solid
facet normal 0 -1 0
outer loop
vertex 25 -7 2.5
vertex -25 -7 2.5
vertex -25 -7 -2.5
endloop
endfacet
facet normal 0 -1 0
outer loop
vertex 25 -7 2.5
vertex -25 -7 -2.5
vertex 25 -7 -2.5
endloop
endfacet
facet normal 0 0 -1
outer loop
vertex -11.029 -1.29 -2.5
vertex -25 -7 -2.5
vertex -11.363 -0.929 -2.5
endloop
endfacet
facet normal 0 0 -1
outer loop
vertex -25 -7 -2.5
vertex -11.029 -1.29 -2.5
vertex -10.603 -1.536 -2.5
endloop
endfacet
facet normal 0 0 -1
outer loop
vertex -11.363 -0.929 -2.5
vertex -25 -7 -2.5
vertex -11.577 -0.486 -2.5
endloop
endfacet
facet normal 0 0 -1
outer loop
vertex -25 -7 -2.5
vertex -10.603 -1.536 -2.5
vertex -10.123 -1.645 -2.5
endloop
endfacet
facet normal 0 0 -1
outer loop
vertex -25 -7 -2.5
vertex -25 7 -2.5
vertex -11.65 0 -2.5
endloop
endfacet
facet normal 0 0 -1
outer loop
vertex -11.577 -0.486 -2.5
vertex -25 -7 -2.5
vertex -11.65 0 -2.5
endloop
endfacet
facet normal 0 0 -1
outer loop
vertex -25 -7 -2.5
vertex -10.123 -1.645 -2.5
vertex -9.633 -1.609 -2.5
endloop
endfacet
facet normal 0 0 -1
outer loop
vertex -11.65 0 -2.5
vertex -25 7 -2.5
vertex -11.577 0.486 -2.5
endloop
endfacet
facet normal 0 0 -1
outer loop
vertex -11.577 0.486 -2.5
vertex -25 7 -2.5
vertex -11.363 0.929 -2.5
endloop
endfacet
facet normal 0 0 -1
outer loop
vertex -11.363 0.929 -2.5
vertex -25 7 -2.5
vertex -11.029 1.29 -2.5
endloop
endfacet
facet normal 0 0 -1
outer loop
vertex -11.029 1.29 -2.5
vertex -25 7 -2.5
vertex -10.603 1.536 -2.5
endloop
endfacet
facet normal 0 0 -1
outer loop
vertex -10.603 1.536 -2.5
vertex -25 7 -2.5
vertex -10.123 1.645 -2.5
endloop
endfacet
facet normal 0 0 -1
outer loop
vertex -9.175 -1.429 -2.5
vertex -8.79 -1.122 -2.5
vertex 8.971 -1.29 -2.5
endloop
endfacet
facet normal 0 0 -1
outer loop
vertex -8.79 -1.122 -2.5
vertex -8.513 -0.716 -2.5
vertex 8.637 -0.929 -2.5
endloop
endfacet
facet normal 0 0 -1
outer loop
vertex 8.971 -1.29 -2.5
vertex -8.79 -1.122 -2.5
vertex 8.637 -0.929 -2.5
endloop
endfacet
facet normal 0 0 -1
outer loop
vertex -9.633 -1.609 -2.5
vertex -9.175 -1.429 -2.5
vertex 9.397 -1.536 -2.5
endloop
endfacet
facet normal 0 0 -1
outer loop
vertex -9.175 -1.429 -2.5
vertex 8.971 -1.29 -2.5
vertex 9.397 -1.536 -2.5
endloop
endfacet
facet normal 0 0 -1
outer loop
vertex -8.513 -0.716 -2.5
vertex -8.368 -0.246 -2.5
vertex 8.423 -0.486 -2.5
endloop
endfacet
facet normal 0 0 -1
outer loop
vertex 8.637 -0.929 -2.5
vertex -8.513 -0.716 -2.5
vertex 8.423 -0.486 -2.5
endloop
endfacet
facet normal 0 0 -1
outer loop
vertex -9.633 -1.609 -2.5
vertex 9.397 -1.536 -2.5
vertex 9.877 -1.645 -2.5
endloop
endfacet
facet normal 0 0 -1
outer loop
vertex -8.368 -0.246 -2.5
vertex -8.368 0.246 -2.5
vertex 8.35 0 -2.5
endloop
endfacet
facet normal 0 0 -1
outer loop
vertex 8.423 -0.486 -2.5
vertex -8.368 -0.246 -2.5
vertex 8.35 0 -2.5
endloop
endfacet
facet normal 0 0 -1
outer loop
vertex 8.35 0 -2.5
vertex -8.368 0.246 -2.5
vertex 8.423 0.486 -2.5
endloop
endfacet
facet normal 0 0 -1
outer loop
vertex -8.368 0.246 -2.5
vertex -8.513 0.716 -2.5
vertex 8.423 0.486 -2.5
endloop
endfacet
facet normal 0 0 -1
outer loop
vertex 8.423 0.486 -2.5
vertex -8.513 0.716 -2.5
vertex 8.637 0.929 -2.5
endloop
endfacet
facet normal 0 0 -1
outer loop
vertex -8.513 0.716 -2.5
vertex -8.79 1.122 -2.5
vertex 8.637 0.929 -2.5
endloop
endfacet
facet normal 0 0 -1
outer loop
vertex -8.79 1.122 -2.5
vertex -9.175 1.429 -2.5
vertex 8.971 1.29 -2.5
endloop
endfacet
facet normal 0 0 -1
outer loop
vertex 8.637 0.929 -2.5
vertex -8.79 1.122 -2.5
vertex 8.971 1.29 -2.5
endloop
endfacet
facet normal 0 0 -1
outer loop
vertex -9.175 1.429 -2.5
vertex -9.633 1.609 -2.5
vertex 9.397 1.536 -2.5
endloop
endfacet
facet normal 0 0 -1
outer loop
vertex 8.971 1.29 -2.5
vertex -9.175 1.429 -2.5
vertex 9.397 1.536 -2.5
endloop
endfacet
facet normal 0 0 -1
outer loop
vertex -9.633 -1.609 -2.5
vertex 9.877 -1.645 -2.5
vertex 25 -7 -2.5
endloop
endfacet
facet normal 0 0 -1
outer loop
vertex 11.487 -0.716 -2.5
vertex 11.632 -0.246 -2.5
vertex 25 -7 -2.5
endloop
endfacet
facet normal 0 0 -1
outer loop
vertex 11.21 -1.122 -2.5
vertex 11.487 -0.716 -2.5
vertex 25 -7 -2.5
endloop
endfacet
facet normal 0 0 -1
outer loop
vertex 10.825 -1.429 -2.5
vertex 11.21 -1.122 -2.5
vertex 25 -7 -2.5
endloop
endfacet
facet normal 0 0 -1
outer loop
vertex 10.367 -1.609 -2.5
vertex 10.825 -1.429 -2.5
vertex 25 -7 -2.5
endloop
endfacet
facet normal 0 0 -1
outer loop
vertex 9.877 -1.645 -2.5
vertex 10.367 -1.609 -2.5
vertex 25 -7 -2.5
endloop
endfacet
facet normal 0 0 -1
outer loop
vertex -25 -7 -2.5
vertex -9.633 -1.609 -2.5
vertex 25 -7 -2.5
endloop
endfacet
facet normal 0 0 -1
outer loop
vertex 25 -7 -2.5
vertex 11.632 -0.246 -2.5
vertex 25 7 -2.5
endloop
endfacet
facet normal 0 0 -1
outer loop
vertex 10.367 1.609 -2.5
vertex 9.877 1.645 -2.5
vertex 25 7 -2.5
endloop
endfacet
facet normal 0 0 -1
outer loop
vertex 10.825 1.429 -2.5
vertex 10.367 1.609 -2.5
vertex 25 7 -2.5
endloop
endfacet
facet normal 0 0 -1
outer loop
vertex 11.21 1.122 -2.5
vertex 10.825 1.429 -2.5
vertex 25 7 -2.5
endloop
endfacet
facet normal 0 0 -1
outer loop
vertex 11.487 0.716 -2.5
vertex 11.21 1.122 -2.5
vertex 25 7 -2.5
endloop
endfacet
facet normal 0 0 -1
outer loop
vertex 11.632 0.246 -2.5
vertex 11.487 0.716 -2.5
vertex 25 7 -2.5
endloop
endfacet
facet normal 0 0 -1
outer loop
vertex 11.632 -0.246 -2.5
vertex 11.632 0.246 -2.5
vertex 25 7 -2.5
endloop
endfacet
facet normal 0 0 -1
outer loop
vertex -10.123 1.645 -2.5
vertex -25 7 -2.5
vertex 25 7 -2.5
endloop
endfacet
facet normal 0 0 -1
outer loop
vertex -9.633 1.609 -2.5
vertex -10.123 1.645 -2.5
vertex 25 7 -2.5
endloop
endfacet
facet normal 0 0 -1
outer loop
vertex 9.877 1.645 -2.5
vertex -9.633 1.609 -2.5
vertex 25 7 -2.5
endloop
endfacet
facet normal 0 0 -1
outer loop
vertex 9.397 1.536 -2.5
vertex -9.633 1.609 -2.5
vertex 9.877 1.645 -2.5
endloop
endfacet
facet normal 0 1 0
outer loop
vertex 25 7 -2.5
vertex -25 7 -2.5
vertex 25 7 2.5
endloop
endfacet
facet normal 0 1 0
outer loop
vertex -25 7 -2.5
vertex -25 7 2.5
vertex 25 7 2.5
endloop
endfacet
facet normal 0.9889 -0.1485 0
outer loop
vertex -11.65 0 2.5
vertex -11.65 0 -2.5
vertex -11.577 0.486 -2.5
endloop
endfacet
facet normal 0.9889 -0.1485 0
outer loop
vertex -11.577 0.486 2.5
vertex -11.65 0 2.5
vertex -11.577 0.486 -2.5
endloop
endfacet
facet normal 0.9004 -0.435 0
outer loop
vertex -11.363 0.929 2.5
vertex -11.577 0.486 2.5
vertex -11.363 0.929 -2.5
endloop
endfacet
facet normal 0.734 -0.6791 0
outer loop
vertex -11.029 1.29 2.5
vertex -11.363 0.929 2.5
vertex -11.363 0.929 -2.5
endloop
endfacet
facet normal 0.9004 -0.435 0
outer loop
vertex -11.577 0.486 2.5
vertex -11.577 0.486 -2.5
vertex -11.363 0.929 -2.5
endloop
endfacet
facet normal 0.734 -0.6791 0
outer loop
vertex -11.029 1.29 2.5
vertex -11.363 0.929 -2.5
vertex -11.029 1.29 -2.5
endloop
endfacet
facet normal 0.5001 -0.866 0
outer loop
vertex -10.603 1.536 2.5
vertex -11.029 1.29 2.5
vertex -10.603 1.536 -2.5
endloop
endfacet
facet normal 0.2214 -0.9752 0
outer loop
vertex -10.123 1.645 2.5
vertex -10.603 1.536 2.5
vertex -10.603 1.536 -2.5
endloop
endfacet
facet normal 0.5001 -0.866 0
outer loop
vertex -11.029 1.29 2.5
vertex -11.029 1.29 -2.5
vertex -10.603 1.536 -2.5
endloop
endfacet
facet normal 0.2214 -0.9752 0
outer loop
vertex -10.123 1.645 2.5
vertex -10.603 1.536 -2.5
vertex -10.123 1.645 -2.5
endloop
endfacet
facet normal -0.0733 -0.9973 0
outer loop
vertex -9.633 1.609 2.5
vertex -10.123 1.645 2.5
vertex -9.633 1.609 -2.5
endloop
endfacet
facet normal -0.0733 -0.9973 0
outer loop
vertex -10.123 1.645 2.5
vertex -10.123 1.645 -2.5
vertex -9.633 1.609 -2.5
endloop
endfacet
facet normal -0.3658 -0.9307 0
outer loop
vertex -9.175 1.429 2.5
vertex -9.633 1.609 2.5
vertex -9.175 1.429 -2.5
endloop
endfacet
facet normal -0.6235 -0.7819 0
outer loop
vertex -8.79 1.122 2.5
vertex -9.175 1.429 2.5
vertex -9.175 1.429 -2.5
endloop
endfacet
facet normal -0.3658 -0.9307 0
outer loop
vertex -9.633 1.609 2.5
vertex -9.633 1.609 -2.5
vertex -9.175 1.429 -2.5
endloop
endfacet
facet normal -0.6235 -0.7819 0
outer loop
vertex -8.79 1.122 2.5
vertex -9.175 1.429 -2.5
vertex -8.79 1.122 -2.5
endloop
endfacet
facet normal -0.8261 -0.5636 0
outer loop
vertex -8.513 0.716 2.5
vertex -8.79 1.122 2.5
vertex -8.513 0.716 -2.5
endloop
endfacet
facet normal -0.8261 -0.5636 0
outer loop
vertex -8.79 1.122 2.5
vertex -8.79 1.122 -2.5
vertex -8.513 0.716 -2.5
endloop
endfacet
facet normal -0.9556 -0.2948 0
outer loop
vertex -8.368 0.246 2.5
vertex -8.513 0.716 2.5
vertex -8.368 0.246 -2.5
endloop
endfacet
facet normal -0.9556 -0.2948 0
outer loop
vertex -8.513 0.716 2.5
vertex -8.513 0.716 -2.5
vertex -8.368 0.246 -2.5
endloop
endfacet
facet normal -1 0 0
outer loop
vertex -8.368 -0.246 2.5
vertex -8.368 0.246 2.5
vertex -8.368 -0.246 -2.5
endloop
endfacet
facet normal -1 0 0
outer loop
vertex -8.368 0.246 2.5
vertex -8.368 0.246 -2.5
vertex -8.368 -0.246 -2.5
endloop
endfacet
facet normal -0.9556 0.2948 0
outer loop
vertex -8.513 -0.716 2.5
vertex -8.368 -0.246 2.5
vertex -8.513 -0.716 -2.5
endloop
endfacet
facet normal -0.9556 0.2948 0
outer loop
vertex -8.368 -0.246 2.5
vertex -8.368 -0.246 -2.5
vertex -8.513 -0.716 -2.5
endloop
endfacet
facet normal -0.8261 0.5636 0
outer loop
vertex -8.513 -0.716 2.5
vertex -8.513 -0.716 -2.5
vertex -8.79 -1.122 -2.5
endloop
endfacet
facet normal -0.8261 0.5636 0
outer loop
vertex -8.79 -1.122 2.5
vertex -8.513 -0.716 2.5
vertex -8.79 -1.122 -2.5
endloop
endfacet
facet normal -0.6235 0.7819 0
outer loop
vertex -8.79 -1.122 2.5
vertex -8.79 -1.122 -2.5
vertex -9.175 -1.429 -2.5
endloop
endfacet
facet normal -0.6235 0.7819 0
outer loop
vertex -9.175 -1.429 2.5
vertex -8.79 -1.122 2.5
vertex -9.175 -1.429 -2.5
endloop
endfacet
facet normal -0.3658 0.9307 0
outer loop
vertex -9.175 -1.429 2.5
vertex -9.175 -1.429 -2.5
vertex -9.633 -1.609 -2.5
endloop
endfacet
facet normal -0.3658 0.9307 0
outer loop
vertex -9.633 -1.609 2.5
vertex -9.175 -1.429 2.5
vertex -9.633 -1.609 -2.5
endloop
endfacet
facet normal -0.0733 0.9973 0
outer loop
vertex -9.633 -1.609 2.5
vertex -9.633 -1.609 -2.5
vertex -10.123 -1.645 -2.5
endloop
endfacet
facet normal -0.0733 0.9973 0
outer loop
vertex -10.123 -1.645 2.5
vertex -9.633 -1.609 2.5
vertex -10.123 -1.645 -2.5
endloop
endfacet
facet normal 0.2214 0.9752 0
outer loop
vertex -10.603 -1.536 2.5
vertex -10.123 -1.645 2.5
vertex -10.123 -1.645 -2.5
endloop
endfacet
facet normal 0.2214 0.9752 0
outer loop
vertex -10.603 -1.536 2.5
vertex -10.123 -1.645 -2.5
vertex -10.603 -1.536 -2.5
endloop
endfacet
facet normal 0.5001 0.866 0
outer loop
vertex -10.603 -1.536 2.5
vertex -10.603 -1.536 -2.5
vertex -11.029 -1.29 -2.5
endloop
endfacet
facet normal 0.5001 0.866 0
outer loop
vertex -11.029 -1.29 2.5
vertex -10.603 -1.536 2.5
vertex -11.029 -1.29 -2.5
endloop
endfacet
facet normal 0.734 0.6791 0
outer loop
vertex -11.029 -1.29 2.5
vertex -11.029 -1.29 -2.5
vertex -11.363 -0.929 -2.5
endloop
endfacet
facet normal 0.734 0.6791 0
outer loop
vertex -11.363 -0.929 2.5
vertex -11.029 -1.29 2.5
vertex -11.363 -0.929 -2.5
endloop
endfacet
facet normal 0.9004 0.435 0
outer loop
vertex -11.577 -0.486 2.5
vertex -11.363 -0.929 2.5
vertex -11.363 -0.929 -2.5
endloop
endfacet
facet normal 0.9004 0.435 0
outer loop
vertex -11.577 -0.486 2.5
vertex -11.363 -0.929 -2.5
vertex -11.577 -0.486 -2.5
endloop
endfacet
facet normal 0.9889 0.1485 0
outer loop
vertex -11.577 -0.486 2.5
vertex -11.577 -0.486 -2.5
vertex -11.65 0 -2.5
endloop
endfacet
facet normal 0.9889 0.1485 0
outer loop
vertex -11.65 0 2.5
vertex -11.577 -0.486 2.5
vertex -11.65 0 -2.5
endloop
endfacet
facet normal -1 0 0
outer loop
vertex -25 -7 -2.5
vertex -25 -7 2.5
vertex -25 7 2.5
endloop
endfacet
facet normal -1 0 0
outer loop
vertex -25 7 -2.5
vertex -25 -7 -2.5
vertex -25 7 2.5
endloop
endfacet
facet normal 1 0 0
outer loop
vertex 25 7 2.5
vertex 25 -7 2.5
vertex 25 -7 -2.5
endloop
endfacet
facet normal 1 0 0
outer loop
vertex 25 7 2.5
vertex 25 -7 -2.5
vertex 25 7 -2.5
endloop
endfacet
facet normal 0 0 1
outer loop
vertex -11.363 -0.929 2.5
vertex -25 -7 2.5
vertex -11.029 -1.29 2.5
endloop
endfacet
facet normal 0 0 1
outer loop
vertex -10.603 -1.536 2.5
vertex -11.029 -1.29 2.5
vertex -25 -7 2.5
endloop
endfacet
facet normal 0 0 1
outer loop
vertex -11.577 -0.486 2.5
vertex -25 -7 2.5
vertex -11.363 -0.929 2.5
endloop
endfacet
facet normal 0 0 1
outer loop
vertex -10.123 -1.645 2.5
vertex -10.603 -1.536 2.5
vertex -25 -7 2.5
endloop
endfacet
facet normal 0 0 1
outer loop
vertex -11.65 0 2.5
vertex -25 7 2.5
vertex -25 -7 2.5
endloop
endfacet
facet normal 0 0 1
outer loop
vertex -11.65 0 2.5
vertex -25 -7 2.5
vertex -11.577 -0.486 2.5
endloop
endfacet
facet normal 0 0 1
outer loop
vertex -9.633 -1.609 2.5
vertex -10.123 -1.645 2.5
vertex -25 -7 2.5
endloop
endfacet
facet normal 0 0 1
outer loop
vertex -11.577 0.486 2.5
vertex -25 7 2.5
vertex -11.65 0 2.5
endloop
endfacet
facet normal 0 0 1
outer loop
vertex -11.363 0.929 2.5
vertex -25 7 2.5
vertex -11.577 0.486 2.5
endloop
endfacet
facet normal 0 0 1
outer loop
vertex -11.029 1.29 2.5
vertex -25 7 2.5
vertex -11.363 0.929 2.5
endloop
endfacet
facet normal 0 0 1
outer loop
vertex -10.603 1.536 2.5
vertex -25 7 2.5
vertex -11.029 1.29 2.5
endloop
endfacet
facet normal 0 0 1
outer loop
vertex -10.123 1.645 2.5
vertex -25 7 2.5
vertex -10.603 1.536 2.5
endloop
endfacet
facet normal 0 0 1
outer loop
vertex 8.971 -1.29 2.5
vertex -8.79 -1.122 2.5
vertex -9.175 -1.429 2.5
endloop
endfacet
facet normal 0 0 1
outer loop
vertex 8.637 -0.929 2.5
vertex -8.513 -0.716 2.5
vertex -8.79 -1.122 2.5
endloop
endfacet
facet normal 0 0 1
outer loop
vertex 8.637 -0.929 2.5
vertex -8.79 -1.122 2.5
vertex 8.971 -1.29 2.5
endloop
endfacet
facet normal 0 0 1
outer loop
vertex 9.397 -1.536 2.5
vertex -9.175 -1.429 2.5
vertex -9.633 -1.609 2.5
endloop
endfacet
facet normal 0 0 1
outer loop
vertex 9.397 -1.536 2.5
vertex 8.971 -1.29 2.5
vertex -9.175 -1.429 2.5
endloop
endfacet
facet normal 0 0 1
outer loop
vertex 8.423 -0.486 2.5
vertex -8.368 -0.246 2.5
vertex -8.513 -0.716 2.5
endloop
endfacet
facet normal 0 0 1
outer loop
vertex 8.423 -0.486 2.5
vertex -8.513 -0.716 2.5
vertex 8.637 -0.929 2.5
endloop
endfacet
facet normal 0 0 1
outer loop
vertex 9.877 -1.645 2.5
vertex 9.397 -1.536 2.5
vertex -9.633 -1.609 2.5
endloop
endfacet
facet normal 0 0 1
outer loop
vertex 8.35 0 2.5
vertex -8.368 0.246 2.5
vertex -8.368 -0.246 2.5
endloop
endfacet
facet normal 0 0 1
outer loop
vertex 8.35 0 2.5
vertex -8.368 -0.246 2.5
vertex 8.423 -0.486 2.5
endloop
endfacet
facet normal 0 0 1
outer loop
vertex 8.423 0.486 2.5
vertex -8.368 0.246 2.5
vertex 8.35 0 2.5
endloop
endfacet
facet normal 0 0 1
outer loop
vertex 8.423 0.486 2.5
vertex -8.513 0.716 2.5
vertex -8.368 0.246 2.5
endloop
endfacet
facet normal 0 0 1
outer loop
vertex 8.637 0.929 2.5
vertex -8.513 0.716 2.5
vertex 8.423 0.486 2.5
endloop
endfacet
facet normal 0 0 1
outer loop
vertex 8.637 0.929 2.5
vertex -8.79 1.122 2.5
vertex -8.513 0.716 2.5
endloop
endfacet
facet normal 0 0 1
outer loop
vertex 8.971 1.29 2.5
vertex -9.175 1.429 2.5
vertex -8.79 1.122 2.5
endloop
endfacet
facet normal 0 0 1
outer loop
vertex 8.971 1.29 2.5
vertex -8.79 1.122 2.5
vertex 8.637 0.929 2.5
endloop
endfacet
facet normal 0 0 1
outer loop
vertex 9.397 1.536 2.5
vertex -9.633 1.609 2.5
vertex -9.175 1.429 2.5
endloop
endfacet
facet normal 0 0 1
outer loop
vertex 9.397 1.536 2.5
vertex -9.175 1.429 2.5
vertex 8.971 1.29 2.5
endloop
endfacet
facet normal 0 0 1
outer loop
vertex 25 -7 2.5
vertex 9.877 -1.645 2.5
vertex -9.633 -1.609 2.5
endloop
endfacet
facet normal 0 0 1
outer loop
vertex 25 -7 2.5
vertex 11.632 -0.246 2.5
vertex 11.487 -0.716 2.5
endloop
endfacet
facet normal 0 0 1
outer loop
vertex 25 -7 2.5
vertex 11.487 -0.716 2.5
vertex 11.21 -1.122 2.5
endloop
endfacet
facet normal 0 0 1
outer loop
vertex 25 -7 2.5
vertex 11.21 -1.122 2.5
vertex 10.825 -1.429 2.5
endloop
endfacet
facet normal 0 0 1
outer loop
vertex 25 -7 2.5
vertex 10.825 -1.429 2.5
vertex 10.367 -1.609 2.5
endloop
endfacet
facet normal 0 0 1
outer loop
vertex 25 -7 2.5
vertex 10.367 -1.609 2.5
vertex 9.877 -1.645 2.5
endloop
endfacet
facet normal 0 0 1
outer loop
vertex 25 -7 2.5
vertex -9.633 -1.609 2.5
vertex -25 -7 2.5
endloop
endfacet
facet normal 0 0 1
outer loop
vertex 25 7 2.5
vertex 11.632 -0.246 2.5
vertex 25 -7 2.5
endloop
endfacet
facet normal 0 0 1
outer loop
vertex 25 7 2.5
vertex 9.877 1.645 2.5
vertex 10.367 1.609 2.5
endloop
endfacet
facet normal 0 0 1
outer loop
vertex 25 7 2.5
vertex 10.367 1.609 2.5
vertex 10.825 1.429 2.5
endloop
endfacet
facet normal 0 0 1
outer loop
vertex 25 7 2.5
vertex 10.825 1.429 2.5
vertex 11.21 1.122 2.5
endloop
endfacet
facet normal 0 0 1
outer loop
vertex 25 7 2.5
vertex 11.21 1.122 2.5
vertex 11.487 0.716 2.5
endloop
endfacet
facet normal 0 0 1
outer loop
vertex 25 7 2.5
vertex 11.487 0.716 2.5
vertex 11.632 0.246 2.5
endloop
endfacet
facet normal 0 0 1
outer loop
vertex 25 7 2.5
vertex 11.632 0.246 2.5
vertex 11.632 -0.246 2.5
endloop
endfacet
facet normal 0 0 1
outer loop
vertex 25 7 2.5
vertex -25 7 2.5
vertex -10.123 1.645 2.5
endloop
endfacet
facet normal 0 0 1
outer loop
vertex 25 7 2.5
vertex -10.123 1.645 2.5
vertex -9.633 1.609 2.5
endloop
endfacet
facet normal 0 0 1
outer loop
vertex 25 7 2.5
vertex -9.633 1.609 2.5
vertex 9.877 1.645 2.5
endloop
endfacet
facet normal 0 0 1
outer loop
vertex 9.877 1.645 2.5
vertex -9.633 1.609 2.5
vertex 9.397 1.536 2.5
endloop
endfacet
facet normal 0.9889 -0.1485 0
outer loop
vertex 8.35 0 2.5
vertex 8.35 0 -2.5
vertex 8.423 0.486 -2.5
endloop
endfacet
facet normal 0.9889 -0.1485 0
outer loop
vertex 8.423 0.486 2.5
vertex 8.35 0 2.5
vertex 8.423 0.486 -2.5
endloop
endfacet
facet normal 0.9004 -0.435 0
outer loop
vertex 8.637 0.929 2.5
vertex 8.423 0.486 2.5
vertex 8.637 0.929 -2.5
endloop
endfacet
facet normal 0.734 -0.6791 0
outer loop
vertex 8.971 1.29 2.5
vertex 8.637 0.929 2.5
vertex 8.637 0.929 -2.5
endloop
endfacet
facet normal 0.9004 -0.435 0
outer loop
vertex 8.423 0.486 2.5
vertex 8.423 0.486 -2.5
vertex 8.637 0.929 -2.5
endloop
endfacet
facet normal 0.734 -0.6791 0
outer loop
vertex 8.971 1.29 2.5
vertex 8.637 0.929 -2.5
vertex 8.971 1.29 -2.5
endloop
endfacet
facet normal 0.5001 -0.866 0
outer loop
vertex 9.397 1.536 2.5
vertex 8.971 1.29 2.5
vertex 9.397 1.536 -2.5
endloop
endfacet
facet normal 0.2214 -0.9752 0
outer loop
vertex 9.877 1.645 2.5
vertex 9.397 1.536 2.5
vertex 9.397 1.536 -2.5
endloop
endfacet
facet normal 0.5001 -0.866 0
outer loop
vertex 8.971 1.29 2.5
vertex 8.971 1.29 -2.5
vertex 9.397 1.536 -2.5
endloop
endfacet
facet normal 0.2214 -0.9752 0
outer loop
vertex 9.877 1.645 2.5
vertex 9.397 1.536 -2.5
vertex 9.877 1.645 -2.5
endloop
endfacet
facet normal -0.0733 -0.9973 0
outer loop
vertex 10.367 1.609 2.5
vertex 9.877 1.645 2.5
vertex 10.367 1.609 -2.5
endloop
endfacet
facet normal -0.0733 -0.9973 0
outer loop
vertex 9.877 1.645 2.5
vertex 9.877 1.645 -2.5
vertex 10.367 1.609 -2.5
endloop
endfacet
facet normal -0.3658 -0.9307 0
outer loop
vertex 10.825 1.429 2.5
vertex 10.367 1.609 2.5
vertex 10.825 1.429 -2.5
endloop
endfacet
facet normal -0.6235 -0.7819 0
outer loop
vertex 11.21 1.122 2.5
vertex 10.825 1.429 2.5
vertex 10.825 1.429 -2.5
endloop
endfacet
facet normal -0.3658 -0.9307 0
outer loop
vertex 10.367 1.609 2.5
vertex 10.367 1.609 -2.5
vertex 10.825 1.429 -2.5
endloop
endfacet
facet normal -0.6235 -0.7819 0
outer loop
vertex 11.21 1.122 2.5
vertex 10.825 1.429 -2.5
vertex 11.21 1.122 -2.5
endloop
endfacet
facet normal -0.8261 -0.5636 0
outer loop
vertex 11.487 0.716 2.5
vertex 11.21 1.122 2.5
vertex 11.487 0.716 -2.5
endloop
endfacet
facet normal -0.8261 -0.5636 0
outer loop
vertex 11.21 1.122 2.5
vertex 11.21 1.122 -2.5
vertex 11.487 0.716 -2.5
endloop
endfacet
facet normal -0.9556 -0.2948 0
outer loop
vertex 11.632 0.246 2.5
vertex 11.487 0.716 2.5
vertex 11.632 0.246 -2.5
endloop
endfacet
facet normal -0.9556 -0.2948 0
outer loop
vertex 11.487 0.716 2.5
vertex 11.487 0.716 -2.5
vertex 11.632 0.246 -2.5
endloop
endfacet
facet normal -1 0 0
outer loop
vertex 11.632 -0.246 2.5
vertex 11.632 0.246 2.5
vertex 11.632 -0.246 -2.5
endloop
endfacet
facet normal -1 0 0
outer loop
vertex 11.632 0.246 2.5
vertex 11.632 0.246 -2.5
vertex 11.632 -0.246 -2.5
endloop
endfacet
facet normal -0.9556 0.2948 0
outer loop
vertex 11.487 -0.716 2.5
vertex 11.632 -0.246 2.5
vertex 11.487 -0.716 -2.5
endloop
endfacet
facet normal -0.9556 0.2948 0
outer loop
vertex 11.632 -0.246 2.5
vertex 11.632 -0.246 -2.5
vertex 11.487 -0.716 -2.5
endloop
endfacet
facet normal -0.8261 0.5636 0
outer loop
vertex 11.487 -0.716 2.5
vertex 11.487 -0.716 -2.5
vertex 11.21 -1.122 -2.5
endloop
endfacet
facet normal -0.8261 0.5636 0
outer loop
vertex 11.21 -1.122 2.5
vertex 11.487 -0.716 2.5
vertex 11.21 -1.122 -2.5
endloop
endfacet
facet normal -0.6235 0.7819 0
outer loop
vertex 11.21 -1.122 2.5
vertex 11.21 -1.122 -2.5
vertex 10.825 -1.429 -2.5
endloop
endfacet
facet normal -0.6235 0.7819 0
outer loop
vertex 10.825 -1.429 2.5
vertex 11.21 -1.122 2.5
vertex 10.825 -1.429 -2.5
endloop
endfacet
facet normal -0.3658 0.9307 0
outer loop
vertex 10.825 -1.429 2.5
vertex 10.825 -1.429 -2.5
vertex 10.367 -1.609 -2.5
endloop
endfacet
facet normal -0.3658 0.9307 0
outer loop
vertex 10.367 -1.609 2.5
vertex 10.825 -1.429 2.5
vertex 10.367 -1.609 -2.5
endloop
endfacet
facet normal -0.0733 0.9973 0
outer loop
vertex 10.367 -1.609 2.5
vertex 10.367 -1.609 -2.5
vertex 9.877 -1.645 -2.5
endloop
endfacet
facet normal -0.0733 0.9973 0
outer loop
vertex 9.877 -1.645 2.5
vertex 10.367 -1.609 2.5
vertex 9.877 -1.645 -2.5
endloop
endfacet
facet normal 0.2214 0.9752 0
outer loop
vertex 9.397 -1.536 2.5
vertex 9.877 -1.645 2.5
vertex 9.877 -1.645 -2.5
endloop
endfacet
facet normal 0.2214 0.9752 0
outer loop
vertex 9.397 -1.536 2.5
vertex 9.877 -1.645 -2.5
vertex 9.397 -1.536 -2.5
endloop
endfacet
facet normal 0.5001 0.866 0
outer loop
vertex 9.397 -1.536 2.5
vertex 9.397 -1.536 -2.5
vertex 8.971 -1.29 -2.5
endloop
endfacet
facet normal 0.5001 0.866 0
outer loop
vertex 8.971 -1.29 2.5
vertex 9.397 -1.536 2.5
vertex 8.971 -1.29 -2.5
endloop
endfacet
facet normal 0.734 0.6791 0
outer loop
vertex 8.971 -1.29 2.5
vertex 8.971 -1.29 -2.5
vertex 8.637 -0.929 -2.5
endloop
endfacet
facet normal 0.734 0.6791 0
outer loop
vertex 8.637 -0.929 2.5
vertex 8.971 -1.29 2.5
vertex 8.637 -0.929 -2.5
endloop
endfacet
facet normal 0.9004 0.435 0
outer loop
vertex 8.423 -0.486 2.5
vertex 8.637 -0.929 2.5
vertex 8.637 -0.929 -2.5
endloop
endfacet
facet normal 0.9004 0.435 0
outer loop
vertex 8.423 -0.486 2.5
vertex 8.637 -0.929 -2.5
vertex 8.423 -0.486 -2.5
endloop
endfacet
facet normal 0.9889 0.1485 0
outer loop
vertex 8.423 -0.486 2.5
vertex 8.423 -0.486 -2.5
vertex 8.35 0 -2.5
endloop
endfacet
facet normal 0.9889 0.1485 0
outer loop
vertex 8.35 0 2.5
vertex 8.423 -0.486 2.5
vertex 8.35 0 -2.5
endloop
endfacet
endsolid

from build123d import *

# Parameters (mm, degrees)
SKETCH1_W             = 50
SKETCH1_H             = 14
BOSS_EXTRUDE1_DEPTH   = 2.5
M4X0_7_TAPPED_HOLE1_D = 3.3


with BuildPart() as part:
    # Sketch1 → Boss-Extrude1 (new body, symmetric)
    with BuildSketch(Plane.XY):
        Rectangle(SKETCH1_W, SKETCH1_H)
    extrude(amount=BOSS_EXTRUDE1_DEPTH, both=True)

    # M4x0.7 Tapped Hole1 (through all)
    with Locations(Plane.XY.offset(2.5)):
        with Locations((-10, 0), (10, 0)):
            Hole(M4X0_7_TAPPED_HOLE1_D / 2)


solid = part.part
